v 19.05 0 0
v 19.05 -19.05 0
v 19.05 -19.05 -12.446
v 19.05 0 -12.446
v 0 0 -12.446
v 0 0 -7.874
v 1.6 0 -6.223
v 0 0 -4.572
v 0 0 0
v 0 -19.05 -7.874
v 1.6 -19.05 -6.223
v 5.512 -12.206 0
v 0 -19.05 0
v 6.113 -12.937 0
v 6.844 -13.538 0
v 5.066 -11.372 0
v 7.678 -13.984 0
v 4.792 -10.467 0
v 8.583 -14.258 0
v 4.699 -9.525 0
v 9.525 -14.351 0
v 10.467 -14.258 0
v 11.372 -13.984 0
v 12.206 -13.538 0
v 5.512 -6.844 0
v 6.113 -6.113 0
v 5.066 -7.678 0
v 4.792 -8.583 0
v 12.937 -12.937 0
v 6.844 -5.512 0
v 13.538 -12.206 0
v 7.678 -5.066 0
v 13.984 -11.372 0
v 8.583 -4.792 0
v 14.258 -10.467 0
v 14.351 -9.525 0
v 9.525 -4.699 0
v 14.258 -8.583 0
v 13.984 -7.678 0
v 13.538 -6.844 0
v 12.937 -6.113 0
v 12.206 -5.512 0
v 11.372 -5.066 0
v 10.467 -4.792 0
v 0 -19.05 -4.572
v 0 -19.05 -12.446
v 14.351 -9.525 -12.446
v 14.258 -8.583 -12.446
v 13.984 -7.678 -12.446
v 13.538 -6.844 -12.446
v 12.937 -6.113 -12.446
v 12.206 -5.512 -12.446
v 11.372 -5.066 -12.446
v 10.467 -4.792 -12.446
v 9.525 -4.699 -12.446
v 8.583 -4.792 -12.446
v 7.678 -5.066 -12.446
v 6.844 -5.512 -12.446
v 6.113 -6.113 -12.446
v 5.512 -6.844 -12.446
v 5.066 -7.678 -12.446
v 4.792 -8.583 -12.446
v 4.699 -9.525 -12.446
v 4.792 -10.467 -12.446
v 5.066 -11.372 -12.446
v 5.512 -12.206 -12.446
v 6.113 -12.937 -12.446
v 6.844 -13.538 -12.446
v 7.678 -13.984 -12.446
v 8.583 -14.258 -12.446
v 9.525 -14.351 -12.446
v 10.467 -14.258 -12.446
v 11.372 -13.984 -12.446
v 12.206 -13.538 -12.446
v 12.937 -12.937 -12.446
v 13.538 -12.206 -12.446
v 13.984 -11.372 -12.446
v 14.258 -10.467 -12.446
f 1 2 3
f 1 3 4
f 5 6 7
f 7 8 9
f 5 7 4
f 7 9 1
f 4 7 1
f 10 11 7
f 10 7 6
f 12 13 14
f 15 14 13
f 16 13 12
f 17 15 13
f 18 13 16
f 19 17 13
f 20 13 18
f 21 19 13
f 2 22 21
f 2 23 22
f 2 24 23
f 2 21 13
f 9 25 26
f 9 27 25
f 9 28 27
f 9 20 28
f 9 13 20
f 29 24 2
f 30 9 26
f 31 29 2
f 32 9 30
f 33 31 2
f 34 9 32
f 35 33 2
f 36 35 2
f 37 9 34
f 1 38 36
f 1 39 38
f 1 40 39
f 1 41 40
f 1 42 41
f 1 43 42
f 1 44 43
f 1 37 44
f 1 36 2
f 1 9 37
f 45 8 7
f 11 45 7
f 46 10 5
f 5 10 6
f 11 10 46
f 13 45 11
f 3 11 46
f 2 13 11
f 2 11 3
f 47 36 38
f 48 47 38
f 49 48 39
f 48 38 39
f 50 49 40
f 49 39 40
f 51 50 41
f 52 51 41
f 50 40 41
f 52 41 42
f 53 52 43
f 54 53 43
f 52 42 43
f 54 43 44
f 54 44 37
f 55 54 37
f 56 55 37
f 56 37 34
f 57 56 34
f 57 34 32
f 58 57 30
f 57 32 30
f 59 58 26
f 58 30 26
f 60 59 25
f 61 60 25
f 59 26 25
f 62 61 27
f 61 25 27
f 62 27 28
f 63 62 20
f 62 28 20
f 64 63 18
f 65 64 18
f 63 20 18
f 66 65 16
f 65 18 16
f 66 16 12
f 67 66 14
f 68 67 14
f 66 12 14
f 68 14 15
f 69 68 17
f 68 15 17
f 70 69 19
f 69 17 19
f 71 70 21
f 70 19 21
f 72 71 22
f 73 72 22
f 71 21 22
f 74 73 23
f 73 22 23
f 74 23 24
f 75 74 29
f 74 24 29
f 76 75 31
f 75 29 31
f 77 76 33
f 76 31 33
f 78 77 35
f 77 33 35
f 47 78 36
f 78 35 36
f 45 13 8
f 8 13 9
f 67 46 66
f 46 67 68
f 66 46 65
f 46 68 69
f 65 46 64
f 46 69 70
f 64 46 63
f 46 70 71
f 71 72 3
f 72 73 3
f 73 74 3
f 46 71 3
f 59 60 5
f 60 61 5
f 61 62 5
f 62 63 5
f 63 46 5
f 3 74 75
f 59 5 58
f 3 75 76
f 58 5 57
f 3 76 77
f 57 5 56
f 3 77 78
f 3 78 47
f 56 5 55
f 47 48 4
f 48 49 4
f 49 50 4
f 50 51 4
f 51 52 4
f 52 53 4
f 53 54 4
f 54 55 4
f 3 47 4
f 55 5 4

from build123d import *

# Parameters (mm, degrees)
SKETCH1_W               = 19.05
SKETCH1_H               = 19.05
SKETCH1_R               = 4.826
BOSS_EXTRUDE1_DEPTH     = 12.446
CUT_EXTRUDE1_DEPTH      = 30.676723471
CUT_EXTRUDE1_DEPTH_BACK = 30.676723471


with BuildPart() as part:
    # Sketch1 → Boss-Extrude1 (new body)
    with BuildSketch(Plane.XY):
        with Locations((9.525, -9.525)):
            Rectangle(SKETCH1_W, SKETCH1_H)
        with Locations((9.525, -9.525)):
            Circle(SKETCH1_R, mode=Mode.SUBTRACT)
    extrude(amount=-BOSS_EXTRUDE1_DEPTH)

    # Sketch2 → Cut-Extrude1 (cut, two sides: drawn at the far end of the back side and taken through both)
    with BuildSketch(Plane(origin=(0, 0, 0), x_dir=(1, 0, 0), z_dir=(0, 1, 0)).offset(-CUT_EXTRUDE1_DEPTH_BACK)):
        Polygon((-35.652150586, -32.211964891), (0, 4.572), (1.6002, 6.223), (0, 7.874), (-35.652150586, 44.657964891), (-138.104791636, 44.657964891), (-138.104791636, -32.211964891), align=None)
    extrude(amount=CUT_EXTRUDE1_DEPTH + CUT_EXTRUDE1_DEPTH_BACK, mode=Mode.SUBTRACT)


solid = part.part
